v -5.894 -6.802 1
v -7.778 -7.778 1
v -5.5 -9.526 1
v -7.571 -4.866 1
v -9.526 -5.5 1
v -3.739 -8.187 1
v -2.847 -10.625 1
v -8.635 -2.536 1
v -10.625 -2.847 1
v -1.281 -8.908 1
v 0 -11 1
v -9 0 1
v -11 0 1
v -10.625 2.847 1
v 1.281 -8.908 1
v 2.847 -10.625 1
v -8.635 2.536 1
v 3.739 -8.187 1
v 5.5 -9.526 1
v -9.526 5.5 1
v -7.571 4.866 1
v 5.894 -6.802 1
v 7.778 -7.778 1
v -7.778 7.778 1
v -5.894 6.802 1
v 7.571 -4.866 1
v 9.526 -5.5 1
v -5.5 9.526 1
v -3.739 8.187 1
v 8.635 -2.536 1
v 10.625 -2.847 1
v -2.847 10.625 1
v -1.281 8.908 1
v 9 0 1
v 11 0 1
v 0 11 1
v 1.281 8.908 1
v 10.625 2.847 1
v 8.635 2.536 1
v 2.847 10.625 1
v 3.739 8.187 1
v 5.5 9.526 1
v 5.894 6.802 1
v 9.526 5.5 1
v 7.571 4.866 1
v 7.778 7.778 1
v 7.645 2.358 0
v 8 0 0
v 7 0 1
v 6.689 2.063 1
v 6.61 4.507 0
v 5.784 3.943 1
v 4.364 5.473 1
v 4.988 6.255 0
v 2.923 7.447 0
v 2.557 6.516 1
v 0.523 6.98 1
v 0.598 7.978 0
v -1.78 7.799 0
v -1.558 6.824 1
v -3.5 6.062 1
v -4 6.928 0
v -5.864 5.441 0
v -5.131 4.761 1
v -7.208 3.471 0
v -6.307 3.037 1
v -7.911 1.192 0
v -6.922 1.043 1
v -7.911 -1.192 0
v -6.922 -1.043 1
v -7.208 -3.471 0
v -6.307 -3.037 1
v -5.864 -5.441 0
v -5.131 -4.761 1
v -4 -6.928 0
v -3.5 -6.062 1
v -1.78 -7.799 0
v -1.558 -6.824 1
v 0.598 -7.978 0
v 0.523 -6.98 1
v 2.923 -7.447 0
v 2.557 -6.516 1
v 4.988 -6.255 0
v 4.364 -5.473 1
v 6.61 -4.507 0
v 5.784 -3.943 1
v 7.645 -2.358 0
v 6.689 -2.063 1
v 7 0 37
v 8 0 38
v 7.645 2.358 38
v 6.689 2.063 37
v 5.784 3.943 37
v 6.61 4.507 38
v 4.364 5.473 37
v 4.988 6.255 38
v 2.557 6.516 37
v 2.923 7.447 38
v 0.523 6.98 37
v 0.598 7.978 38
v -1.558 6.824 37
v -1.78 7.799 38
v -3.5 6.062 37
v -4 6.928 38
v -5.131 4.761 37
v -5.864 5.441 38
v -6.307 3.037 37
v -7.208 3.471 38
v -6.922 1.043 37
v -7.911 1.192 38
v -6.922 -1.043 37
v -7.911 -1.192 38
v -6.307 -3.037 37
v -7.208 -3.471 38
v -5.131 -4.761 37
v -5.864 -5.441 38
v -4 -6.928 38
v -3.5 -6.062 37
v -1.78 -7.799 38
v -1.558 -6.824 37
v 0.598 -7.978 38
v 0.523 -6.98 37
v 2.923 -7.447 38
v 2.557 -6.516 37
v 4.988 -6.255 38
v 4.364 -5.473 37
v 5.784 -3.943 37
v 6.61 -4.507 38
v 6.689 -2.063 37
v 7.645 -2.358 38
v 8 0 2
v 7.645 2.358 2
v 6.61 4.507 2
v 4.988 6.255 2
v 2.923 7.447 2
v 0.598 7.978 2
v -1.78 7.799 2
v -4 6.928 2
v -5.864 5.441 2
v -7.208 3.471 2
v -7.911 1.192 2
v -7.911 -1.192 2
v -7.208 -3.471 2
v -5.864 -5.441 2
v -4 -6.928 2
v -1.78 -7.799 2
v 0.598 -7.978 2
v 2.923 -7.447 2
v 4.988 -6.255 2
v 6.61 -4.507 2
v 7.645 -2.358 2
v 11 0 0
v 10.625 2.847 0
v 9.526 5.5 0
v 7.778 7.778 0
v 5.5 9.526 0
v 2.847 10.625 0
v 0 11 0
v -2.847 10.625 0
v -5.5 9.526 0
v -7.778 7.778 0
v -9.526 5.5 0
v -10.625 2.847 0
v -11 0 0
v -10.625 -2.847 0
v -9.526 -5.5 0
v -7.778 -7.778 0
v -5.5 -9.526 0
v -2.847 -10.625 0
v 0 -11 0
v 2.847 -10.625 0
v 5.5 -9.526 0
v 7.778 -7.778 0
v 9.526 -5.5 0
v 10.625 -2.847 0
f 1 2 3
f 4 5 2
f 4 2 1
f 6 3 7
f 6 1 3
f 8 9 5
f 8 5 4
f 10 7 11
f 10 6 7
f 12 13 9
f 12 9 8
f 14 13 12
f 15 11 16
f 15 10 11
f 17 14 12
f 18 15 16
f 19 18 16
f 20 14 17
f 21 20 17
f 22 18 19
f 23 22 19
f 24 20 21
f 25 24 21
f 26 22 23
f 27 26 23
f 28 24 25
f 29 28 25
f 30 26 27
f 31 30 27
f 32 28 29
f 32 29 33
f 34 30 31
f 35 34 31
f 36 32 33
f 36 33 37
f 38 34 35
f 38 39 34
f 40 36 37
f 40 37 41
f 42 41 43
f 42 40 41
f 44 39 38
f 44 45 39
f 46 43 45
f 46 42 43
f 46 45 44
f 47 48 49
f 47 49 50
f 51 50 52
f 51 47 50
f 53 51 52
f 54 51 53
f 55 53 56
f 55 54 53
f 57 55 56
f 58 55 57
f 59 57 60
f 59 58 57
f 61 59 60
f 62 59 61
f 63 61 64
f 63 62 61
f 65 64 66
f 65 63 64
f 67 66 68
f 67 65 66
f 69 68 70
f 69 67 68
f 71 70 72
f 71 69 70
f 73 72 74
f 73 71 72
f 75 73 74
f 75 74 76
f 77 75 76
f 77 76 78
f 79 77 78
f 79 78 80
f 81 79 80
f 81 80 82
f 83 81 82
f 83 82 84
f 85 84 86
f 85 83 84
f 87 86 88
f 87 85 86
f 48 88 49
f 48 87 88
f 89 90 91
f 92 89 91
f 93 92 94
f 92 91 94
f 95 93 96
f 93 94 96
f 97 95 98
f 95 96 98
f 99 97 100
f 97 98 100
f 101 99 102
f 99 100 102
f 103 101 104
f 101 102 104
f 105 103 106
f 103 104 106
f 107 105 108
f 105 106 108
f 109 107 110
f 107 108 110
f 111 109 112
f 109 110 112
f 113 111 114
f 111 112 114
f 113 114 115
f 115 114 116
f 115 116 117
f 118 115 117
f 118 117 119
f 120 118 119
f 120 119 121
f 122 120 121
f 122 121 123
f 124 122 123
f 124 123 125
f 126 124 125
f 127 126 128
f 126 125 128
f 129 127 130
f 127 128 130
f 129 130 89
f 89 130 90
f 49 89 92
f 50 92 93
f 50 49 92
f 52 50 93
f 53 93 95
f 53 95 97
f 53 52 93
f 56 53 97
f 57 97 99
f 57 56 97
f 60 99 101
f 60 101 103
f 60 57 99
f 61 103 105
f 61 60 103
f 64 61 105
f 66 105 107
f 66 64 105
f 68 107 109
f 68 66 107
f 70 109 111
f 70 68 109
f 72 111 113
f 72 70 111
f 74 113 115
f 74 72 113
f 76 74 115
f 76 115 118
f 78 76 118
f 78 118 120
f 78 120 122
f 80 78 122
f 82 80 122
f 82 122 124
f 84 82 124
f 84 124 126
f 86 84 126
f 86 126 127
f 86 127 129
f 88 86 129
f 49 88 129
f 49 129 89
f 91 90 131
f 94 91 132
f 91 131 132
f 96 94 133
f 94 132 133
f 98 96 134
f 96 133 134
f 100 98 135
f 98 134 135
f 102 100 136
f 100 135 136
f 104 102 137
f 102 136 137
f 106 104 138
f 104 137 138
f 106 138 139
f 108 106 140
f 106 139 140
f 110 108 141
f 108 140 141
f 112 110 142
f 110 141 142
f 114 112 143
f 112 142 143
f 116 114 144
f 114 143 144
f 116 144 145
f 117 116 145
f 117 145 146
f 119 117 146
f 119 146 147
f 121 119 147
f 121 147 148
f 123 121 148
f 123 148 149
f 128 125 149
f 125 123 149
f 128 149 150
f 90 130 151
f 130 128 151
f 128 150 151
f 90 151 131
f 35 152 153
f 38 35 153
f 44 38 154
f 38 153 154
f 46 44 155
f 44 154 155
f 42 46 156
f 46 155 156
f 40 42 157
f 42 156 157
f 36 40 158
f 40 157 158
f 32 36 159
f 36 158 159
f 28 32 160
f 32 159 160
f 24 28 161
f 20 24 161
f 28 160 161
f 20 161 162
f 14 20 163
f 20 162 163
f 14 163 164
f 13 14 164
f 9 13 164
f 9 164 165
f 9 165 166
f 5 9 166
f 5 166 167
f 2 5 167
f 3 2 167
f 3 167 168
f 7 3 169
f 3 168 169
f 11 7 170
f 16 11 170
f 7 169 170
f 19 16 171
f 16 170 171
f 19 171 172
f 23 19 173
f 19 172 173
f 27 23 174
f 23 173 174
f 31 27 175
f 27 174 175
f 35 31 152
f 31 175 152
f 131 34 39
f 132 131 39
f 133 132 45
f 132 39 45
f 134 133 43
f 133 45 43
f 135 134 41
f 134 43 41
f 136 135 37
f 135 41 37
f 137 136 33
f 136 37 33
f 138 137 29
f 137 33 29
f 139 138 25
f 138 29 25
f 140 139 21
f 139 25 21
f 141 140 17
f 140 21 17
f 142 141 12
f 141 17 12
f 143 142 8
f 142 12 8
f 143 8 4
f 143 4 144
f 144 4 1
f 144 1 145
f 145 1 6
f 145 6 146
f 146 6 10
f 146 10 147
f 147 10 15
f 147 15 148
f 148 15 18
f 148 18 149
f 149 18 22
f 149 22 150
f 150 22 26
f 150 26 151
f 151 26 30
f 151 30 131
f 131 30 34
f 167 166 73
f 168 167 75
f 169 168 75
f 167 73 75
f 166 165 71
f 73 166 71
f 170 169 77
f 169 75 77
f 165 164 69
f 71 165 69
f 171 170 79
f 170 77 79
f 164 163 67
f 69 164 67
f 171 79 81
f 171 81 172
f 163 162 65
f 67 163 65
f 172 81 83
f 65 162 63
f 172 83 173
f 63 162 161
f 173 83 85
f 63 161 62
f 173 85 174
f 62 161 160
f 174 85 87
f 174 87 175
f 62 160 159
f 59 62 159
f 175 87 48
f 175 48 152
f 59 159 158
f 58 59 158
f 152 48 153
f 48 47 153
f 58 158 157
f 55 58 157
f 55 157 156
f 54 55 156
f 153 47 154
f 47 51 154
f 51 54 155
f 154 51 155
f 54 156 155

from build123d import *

# Parameters (mm, degrees)
F0_R     = 11
F0_R_2   = 8
F1_DEPTH = 1
F0_R_3   = 7
F2_DEPTH = 39
F3_SIZE  = 1


# Not quite as in the source:
# - a fillet or chamfer that OpenCascade refuses, or shapes differently, is made with other operations: its cross-section is extruded or revolved along the edge and cut away or added


with BuildPart() as f1:
    # F0 (on Top) → F1 (new body)
    with BuildSketch(Plane.XY):
        Circle(F0_R)
        Circle(F0_R_2, mode=Mode.SUBTRACT)
    extrude(amount=F1_DEPTH)

    # F0 (on Top) → F2 (join)
    with BuildSketch(Plane.XY):
        Circle(F0_R_2)
        Circle(F0_R_3, mode=Mode.SUBTRACT)
    extrude(amount=F2_DEPTH)

    # F3
    f3_edges = [f1.edges().sort_by_distance(p)[0] for p in [
        (-8, 0, 1),
        (-7, 0, 0),
    ]]
    chamfer(f3_edges, length=F3_SIZE)

    # F4: chamfer of 2 on 1 edges, made by hand

    # F4_s1 → F4_t2 (revolve, cut)
    with BuildSketch(Plane.XZ):
        Polygon((7, 37), (9, 39), (7, 39), align=None)
    revolve(axis=Axis((0, 0, 39), (0, 0, 1)), mode=Mode.SUBTRACT)


solid = f1.part
